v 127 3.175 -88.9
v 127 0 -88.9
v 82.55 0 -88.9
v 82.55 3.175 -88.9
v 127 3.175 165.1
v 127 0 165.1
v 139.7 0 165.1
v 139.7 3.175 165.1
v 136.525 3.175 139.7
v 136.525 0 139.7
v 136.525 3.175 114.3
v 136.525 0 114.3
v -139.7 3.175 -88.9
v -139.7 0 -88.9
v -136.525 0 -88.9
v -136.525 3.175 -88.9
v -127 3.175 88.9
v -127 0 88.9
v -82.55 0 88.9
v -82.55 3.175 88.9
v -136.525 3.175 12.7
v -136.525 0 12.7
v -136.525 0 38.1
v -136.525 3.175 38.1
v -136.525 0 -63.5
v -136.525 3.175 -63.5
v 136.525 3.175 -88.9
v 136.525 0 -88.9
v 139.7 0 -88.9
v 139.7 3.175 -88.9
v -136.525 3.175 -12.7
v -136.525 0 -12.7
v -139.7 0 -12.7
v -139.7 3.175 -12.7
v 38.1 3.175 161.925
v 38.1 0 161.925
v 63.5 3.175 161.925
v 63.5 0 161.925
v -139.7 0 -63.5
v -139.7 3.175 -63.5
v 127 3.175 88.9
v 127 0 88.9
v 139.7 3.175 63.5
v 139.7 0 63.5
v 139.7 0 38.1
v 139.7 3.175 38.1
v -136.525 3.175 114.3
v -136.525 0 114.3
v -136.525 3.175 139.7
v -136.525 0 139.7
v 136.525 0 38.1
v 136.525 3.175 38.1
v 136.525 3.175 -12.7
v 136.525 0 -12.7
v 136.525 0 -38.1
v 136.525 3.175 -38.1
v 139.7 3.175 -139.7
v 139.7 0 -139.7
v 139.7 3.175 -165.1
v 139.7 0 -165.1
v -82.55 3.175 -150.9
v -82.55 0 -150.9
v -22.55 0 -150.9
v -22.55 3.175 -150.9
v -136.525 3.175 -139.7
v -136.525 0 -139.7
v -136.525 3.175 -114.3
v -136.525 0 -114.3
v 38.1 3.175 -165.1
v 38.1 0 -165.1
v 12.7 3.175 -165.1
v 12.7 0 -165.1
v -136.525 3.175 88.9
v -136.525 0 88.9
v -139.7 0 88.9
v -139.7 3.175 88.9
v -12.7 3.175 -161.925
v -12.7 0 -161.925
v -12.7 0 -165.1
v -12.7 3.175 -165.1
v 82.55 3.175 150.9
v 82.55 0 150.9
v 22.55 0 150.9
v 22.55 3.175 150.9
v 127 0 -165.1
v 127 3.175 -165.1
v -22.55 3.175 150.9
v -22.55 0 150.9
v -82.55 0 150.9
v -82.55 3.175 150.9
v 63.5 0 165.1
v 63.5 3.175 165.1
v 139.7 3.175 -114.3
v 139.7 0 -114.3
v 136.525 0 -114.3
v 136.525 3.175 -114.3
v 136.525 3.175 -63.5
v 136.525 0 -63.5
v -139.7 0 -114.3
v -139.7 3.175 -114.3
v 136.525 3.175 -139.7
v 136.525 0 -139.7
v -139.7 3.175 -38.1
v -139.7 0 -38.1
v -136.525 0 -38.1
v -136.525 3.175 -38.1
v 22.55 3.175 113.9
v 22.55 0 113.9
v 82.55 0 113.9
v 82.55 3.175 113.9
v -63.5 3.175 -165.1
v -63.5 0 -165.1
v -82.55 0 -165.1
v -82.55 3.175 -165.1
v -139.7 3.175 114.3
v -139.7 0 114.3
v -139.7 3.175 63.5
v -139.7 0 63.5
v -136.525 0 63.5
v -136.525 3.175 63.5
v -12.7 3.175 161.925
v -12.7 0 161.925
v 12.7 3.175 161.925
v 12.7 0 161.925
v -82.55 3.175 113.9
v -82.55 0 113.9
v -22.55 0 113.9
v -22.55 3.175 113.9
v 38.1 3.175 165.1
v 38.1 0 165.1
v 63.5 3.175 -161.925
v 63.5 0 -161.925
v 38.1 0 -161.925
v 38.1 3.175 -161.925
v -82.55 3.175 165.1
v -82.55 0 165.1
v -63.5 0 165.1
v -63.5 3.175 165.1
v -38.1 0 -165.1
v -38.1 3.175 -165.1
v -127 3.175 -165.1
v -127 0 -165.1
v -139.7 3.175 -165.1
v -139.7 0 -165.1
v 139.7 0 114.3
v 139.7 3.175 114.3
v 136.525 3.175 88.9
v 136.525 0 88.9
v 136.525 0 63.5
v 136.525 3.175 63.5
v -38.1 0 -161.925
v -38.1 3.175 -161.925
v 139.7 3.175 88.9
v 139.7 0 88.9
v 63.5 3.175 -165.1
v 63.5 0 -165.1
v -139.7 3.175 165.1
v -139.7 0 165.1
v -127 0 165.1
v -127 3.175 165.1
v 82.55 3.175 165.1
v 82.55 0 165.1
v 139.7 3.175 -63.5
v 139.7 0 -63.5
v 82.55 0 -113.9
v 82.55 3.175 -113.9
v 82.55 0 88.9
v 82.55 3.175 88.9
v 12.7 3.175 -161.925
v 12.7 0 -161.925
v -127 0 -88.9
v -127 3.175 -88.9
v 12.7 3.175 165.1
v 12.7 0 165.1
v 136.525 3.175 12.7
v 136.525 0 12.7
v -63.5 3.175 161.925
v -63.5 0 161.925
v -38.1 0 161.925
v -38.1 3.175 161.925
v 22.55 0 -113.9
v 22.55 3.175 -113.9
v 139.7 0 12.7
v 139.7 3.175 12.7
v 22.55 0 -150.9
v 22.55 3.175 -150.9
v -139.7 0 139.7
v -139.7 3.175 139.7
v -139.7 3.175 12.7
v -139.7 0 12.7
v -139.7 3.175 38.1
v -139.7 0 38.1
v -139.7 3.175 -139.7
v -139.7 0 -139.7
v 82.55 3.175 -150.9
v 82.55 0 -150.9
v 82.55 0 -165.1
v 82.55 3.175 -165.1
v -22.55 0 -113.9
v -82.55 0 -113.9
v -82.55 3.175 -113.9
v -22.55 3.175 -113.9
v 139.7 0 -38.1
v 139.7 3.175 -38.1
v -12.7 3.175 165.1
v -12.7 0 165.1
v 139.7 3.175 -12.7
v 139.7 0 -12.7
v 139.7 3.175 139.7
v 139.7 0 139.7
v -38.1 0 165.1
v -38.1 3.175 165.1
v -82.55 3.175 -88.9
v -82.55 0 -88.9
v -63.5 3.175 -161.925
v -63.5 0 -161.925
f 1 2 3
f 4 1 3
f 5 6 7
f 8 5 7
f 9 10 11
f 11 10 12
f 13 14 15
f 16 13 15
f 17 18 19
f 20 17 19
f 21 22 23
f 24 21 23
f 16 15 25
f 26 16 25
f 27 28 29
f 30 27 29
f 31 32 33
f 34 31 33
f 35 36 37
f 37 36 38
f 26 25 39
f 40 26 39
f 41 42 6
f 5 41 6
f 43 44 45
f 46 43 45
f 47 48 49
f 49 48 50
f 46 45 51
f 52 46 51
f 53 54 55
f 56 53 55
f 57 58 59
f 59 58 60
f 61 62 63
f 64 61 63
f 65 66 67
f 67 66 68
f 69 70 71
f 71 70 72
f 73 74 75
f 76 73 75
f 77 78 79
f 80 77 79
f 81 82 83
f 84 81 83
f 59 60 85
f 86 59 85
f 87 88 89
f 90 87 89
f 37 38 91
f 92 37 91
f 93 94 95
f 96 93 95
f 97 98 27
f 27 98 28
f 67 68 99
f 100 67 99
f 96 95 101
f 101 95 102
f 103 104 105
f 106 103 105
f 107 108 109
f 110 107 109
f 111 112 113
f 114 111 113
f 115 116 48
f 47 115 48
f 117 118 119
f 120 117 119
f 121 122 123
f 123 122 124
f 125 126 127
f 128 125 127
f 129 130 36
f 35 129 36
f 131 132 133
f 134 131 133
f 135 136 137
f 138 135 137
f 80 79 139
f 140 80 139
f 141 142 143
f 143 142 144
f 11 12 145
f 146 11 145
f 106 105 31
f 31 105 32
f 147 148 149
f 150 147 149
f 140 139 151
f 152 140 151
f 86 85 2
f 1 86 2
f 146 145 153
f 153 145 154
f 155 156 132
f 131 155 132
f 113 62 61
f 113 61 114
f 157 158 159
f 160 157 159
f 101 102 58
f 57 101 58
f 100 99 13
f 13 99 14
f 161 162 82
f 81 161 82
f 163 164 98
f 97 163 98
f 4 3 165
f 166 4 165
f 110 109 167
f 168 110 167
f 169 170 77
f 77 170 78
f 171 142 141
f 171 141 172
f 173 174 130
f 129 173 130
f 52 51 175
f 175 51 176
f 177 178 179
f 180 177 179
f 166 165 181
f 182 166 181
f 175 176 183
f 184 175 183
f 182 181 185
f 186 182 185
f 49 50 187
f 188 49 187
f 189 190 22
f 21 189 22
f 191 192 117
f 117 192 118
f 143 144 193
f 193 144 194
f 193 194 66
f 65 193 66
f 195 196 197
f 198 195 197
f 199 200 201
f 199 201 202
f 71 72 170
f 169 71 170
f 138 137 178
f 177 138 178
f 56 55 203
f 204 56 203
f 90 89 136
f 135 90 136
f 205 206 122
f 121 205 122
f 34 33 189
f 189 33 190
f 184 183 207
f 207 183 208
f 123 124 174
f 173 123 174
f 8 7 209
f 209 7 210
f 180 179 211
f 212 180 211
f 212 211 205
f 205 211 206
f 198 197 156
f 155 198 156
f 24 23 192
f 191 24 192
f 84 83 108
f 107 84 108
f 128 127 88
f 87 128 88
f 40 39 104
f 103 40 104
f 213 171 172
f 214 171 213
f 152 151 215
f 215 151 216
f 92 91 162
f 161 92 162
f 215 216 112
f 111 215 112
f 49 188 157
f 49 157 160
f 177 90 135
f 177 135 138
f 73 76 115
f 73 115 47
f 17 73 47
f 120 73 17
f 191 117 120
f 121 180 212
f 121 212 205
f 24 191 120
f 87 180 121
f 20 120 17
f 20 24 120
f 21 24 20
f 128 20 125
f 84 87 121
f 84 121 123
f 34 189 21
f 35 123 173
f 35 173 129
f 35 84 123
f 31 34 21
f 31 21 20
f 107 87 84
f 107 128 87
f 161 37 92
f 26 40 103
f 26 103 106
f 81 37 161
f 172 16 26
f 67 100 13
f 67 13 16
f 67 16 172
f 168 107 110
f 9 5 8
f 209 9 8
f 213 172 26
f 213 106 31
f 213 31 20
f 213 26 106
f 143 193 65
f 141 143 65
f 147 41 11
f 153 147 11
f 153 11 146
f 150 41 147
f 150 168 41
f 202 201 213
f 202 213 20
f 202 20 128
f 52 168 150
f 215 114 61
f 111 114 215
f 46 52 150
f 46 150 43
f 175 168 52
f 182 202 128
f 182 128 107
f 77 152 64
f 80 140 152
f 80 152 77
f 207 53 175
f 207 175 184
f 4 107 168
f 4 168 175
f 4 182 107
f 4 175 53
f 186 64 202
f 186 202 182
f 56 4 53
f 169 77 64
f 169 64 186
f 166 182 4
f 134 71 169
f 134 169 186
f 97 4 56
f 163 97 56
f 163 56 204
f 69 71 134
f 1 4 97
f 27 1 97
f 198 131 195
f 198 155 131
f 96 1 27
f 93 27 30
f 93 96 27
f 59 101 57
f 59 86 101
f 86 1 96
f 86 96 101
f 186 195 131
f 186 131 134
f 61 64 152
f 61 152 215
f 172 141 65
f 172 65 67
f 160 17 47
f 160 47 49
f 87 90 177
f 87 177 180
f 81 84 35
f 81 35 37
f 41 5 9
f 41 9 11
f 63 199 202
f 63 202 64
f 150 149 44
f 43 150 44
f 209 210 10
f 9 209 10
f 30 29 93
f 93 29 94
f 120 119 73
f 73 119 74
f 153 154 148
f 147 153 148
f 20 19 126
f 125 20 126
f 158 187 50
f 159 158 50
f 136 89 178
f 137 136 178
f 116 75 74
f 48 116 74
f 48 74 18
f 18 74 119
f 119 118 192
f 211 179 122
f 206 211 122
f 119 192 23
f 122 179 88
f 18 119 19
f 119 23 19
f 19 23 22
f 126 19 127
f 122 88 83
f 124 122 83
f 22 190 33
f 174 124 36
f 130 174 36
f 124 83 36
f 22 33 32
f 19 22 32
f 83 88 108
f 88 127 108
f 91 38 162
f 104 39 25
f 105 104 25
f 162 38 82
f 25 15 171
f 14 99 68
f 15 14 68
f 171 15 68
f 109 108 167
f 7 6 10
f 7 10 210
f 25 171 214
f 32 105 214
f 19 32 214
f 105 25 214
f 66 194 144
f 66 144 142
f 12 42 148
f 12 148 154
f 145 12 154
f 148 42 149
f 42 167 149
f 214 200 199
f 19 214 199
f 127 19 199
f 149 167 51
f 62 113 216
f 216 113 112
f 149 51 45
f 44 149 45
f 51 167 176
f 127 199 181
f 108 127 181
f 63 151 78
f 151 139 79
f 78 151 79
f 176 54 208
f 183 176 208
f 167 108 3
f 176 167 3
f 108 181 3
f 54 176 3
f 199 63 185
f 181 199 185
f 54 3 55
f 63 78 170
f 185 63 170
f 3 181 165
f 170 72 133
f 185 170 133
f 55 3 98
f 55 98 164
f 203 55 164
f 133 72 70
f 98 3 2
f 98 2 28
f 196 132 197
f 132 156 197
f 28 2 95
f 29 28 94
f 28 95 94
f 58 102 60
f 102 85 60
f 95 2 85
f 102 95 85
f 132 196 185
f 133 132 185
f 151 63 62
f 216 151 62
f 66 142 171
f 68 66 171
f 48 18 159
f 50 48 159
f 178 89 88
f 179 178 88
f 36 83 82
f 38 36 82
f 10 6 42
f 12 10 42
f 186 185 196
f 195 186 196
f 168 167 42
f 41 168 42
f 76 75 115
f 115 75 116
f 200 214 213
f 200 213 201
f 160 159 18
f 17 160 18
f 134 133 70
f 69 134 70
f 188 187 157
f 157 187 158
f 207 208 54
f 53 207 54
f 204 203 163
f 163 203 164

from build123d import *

# Parameters (mm, degrees)
BOSS_EXTRUDE1_DEPTH     = 3.175
CUT_EXTRUDE1_DEPTH      = 217.296510894
CUT_EXTRUDE1_DEPTH_BACK = 217.296510894
SKETCH3_W               = 60
SKETCH3_H               = 37
MIRROR1_DEPTH           = 3.175


# Read off the part's stored shape, not the designer's step: Mirror1
with BuildPart() as part:
    # Sketch1 → Boss-Extrude1 (new body)
    with BuildSketch(Plane(origin=(0, 0, 0), x_dir=(1, 0, 0), z_dir=(0, 1, 0))):
        Polygon((-139.7, 0), (0, 0), (0, 161.925), (-12.7, 161.925), (-12.7, 165.1), (-38.1, 165.1), (-38.1, 161.925), (-63.5, 161.925), (-63.5, 165.1), (-88.9, 165.1), (-88.9, 161.925), (-114.3, 161.925), (-114.3, 165.1), (-139.7, 165.1), (-139.7, 139.7), (-136.525, 139.7), (-136.525, 114.3), (-139.7, 114.3), (-139.7, 88.9), (-136.525, 88.9), (-136.525, 63.5), (-139.7, 63.5), (-139.7, 38.1), (-136.525, 38.1), (-136.525, 12.7), (-139.7, 12.7), align=None)
    extrude(amount=BOSS_EXTRUDE1_DEPTH)

    # Sketch3 → Cut-Extrude1 (cut, two sides: drawn at the far end of the back side and taken through both)
    with BuildSketch(Plane(origin=(0, 3.175, 0), x_dir=(1, 0, 0), z_dir=(0, 1, 0)).offset(-CUT_EXTRUDE1_DEPTH_BACK)):
        with Locations((-52.55, 132.4)):
            Rectangle(SKETCH3_W, SKETCH3_H)
        Polygon((-127, 165.1), (-127, 88.9), (-82.55, 88.9), (-82.55, 113.9), (-82.55, 150.9), (-82.55, 165.1), (-88.9, 165.1), (-88.9, 161.925), (-114.3, 161.925), (-114.3, 165.1), align=None)
    extrude(amount=CUT_EXTRUDE1_DEPTH + CUT_EXTRUDE1_DEPTH_BACK, mode=Mode.SUBTRACT)

    # Mirror1 outline → Mirror1 (add)
    with BuildSketch(Plane(origin=(0, 0, 0), x_dir=(1, 0, 0), z_dir=(0, 1, 0))):
        Polygon((139.7, 165.1), (127, 165.1), (127, 88.9), (82.55, 88.9), (82.55, 113.9), (22.55, 113.9), (22.55, 150.9), (82.55, 150.9), (82.55, 165.1), (63.5, 165.1), (63.5, 161.925), (38.1, 161.925), (38.1, 165.1), (12.7, 165.1), (12.7, 161.925), (0, 161.925), (0, 0), (-139.7, 0), (-139.7, -12.7), (-136.525, -12.7), (-136.525, -38.1), (-139.7, -38.1), (-139.7, -63.5), (-136.525, -63.5), (-136.525, -88.9), (-139.7, -88.9), (-139.7, -114.3), (-136.525, -114.3), (-136.525, -139.7), (-139.7, -139.7), (-139.7, -165.1), (-127, -165.1), (-127, -88.9), (-82.55, -88.9), (-82.55, -113.9), (-22.55, -113.9), (-22.55, -150.9), (-82.55, -150.9), (-82.55, -165.1), (-63.5, -165.1), (-63.5, -161.925), (-38.1, -161.925), (-38.1, -165.1), (-12.7, -165.1), (-12.7, -161.925), (12.7, -161.925), (12.7, -165.1), (38.1, -165.1), (38.1, -161.925), (63.5, -161.925), (63.5, -165.1), (82.55, -165.1), (82.55, -150.9), (22.55, -150.9), (22.55, -113.9), (82.55, -113.9), (82.55, -88.9), (127, -88.9), (127, -165.1), (139.7, -165.1), (139.7, -139.7), (136.525, -139.7), (136.525, -114.3), (139.7, -114.3), (139.7, -88.9), (136.525, -88.9), (136.525, -63.5), (139.7, -63.5), (139.7, -38.1), (136.525, -38.1), (136.525, -12.7), (139.7, -12.7), (139.7, 12.7), (136.525, 12.7), (136.525, 38.1), (139.7, 38.1), (139.7, 63.5), (136.525, 63.5), (136.525, 88.9), (139.7, 88.9), (139.7, 114.3), (136.525, 114.3), (136.525, 139.7), (139.7, 139.7), align=None)
    extrude(amount=MIRROR1_DEPTH)


solid = part.part
